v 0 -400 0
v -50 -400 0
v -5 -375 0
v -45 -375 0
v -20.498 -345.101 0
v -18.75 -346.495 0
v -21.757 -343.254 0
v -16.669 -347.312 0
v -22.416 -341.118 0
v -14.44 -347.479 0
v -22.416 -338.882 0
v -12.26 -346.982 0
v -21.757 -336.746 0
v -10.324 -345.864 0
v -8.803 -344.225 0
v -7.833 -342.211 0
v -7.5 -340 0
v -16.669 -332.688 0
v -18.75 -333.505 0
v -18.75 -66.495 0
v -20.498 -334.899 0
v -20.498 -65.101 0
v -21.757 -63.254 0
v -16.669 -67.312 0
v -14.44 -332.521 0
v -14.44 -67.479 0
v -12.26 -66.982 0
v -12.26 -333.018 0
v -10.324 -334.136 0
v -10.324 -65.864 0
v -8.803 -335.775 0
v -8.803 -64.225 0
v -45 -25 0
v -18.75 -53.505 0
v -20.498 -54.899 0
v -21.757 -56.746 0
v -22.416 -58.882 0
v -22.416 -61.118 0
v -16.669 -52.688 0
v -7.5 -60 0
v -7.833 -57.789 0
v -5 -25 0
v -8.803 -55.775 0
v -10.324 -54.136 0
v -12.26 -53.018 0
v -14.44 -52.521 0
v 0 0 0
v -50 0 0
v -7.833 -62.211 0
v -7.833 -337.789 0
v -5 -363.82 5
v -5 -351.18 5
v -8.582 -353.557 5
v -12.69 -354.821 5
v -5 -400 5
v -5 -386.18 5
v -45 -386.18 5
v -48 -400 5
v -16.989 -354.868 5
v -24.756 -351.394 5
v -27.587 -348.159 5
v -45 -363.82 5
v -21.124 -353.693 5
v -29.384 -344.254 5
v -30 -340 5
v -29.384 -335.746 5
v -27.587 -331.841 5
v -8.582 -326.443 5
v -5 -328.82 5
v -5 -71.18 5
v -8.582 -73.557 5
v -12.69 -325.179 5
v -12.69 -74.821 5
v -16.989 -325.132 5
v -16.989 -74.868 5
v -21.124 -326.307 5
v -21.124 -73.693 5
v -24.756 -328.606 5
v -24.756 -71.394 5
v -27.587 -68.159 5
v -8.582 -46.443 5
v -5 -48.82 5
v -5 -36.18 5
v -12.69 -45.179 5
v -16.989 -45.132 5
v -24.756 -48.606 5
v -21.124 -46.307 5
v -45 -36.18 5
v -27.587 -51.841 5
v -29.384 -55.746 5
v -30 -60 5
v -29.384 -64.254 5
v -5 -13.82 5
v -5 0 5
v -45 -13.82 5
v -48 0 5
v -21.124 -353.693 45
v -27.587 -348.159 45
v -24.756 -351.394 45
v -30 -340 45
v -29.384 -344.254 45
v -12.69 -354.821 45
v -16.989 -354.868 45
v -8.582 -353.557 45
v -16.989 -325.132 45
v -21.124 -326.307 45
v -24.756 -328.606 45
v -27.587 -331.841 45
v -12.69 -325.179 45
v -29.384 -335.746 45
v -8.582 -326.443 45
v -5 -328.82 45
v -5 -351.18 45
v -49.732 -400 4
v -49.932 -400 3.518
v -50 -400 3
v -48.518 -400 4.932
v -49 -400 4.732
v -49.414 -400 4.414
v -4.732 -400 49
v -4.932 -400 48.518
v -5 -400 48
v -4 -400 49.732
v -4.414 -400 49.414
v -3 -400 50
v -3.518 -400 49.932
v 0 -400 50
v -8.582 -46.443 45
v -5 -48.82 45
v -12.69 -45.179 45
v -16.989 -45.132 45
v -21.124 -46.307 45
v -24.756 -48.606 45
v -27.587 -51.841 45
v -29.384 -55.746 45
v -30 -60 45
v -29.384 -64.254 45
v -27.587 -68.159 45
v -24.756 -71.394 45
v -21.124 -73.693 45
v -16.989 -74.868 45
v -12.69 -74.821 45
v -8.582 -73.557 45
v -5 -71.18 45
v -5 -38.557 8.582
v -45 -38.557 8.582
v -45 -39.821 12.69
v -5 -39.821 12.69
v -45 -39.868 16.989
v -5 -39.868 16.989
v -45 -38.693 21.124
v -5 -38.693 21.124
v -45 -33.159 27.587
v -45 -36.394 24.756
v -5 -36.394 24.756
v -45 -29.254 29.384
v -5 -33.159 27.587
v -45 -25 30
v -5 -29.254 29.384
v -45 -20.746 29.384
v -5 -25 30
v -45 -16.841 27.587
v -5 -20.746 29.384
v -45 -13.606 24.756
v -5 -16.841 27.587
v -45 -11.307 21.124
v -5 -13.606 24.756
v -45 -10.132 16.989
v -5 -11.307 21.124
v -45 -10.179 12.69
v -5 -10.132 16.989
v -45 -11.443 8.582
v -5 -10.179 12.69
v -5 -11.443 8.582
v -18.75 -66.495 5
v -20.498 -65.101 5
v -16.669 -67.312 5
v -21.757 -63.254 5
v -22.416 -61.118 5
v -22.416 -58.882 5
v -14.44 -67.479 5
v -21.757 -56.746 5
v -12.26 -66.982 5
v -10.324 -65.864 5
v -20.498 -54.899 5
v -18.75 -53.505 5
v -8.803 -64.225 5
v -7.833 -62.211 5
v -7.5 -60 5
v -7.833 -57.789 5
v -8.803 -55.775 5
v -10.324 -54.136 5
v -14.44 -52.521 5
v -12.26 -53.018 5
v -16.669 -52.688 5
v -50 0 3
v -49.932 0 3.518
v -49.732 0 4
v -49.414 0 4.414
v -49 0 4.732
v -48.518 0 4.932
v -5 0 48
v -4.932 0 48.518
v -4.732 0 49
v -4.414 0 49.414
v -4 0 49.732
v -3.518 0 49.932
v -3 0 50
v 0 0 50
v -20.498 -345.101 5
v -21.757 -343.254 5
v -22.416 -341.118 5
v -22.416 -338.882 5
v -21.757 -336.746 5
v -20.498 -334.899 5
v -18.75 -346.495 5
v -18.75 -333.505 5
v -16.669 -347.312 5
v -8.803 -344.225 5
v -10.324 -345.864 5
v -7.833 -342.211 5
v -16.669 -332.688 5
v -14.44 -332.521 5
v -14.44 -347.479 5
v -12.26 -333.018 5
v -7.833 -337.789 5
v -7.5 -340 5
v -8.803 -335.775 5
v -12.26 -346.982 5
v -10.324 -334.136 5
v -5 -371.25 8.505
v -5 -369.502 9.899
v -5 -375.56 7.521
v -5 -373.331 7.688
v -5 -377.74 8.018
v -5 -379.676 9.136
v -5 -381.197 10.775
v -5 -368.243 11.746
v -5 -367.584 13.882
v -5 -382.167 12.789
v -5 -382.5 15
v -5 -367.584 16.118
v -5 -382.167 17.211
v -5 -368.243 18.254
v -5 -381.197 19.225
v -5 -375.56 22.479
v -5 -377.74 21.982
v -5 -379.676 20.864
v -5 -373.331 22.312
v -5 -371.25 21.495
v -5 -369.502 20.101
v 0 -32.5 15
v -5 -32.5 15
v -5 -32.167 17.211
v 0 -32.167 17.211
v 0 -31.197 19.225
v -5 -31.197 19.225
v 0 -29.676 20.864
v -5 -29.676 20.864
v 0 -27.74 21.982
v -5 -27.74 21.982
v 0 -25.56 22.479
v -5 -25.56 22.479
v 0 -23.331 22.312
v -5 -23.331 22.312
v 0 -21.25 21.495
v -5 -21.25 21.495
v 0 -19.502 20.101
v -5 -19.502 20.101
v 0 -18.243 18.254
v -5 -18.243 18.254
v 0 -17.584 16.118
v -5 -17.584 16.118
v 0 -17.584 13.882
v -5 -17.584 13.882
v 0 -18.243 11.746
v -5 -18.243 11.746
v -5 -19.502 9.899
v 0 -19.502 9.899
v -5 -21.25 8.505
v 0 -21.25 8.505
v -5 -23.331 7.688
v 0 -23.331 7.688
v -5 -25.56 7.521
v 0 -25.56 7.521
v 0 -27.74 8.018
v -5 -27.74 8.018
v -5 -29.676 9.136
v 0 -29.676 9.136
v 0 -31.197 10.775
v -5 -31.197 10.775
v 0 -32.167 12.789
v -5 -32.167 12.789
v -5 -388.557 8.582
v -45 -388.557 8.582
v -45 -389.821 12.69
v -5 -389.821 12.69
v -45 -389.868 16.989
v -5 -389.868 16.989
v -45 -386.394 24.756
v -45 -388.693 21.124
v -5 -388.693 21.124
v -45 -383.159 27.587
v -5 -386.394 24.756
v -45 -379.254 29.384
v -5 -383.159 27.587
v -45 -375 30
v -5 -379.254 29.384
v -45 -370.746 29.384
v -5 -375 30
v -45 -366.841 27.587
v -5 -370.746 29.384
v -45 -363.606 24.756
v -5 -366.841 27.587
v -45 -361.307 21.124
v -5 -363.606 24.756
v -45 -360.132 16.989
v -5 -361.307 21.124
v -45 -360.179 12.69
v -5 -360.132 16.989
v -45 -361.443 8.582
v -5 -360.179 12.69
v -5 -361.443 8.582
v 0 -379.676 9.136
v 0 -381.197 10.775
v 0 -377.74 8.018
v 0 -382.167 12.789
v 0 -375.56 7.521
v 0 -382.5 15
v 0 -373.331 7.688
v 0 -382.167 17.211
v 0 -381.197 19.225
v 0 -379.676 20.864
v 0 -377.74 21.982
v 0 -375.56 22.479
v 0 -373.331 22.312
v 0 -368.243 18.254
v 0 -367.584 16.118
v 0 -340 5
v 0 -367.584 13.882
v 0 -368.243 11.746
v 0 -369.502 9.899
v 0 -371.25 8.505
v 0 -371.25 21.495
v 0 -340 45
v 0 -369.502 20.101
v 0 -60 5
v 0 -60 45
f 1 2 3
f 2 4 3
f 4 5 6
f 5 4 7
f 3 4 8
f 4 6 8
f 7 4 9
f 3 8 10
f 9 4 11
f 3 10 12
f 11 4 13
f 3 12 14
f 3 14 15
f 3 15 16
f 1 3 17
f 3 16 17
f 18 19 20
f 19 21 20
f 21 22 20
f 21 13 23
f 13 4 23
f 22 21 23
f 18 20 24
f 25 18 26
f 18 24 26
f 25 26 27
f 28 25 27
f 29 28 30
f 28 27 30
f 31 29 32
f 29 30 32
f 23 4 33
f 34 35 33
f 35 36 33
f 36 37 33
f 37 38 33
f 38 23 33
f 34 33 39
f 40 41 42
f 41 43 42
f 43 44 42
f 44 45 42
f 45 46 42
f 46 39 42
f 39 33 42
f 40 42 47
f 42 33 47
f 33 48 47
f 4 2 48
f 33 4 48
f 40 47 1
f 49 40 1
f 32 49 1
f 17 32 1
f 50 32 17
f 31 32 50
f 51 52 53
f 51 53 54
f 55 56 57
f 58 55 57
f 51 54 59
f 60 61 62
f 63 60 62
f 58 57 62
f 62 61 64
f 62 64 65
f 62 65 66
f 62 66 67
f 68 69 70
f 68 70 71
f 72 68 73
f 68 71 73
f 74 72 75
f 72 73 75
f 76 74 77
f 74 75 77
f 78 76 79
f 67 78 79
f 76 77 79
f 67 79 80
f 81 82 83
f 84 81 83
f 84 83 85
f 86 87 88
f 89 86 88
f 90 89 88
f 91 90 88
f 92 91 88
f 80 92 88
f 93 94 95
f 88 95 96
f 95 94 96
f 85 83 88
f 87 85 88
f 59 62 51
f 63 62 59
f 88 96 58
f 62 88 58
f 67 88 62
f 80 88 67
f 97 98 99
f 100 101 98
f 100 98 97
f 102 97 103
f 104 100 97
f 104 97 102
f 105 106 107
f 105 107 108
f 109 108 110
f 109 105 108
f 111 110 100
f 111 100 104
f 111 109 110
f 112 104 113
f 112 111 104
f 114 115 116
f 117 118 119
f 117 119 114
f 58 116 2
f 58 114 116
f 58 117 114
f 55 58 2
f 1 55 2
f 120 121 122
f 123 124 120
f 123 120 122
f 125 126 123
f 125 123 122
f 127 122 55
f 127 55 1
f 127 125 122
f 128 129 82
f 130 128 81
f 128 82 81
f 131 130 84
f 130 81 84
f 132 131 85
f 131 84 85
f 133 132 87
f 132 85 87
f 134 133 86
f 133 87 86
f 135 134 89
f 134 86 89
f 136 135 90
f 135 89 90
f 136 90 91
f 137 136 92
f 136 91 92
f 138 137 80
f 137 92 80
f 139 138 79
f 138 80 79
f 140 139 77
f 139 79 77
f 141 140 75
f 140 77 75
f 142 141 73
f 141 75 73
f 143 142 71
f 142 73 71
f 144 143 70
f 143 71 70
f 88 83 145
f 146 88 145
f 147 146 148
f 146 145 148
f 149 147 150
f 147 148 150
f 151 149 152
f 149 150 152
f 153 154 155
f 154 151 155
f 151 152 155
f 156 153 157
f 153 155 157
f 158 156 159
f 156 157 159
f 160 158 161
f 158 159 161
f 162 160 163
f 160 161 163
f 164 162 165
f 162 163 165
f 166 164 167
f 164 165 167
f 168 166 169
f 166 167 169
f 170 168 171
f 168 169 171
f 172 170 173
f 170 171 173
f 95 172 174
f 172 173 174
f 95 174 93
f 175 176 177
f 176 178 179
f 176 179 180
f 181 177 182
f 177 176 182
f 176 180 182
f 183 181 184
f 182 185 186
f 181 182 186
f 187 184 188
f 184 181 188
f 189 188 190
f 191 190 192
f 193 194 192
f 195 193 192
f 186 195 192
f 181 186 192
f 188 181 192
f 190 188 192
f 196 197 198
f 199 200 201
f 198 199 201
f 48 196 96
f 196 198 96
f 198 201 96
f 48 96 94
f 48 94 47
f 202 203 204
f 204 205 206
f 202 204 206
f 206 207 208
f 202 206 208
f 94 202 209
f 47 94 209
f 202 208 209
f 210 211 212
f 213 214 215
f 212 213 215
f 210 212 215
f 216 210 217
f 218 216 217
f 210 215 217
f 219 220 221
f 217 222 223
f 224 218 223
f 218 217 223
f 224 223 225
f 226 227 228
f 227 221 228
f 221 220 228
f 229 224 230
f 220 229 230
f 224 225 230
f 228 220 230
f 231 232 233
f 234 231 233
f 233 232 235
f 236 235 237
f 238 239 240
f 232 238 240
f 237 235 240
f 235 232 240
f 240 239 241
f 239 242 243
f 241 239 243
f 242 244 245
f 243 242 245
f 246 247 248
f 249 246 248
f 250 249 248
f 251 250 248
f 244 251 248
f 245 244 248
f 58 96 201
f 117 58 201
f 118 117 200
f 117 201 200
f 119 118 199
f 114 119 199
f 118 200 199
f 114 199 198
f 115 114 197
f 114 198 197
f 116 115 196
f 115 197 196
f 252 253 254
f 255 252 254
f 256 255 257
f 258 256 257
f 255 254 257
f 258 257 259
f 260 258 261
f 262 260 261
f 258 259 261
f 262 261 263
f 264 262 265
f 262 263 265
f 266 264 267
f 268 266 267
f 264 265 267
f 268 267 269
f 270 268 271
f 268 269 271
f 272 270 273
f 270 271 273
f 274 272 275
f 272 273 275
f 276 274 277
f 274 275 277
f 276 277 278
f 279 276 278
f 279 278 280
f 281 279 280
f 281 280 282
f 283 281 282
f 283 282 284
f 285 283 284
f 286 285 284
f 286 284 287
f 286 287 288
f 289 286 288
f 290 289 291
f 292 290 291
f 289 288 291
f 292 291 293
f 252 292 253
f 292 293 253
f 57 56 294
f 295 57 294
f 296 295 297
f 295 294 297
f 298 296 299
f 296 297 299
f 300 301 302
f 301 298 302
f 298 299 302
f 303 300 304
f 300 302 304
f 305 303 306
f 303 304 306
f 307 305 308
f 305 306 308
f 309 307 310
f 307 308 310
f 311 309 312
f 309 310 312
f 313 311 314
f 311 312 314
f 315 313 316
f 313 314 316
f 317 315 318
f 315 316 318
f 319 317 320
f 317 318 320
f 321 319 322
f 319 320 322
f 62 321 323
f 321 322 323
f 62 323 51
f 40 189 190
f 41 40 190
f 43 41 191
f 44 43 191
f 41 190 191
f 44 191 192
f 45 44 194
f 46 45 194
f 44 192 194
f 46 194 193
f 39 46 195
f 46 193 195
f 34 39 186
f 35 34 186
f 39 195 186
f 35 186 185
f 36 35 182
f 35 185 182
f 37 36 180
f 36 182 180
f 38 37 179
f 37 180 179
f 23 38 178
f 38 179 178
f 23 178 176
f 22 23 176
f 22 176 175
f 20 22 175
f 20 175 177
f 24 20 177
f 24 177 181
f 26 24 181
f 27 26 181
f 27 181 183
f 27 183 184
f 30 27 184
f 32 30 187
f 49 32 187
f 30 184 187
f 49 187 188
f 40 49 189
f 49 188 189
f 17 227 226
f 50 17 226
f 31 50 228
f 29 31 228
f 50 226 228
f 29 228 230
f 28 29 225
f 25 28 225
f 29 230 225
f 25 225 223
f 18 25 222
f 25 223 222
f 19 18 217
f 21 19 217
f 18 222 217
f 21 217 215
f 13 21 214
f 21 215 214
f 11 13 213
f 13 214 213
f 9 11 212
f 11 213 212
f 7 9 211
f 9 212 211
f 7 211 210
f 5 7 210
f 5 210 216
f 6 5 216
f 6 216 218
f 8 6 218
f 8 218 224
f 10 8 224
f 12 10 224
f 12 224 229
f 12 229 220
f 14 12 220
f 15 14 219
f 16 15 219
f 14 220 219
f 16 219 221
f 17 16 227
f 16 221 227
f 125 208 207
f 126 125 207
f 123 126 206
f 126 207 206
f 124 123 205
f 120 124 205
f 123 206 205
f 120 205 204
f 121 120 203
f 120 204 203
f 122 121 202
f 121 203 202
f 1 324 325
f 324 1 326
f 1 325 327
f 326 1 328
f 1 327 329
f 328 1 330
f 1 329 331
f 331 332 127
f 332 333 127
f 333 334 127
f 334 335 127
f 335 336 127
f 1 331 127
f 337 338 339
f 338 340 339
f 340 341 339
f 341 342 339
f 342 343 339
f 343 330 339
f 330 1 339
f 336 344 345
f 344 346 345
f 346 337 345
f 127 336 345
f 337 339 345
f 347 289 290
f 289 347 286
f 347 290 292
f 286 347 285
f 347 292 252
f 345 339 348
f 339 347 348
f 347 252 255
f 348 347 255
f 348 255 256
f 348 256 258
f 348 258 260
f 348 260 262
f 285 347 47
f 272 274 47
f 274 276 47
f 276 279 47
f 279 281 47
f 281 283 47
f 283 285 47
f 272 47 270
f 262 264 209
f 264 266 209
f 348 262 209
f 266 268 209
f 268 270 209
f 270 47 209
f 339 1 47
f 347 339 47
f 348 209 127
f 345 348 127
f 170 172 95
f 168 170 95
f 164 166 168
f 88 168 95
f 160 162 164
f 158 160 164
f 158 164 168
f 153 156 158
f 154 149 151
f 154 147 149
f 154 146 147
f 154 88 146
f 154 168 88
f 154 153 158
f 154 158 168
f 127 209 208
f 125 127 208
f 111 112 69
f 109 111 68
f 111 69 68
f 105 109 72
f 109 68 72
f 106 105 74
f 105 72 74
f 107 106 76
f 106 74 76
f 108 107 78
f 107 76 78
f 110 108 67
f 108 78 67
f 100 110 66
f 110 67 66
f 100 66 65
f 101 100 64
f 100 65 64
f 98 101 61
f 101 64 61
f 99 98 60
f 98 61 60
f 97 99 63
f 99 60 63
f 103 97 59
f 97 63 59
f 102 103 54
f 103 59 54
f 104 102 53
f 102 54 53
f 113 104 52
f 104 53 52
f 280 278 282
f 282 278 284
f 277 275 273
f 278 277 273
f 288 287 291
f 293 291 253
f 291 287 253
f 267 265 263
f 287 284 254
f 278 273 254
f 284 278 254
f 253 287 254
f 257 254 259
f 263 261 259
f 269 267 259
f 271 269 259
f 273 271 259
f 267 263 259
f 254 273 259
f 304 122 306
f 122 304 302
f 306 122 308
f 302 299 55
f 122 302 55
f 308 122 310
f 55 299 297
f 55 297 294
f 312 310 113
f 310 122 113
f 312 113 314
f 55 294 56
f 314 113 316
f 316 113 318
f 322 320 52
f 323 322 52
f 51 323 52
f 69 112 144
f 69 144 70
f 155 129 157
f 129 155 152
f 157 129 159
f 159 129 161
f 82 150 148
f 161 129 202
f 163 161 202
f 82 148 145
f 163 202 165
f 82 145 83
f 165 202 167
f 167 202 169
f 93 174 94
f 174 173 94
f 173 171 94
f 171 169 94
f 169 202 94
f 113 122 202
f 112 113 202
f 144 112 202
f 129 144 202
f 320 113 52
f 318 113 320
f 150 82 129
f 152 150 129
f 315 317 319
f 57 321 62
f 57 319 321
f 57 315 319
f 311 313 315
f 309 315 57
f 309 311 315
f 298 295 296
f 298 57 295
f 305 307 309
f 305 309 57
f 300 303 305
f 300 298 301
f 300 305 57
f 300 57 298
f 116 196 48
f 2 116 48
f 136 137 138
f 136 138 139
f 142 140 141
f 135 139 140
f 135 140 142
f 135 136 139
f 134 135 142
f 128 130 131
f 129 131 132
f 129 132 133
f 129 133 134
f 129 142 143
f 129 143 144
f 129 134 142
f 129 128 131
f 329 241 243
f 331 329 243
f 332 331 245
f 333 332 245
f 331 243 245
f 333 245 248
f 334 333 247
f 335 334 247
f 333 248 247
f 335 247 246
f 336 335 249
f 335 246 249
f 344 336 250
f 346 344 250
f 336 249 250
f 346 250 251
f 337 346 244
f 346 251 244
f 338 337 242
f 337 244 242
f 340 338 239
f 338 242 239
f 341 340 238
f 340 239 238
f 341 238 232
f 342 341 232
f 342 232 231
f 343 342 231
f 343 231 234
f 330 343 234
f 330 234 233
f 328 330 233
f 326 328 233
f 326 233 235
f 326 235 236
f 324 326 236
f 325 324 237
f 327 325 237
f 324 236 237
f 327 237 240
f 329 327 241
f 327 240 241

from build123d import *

# Parameters (mm, degrees)
F1_DEPTH = 400
F2_R     = 7.5
F3_DEPTH = 5
F4_R     = 7.5
F5_DEPTH = 5
F6_R     = 15
F7_DEPTH = 40
F8_R     = 15
F9_DEPTH = 40


with BuildPart() as f1:
    # F0 (on Front) → F1 (new body)
    with BuildSketch(Plane.XZ):
        with BuildLine():
            Line((0, 50), (-3, 50))
            ThreePointArc((-3, 50), (-4.414214, 49.414214), (-5, 48))
            Line((-5, 48), (-5, 5))
            Line((-5, 5), (-48, 5))
            ThreePointArc((-48, 5), (-49.414214, 4.414214), (-50, 3))
            Line((-50, 3), (-50, 0))
            Line((-50, 0), (0, 0))
            Line((0, 0), (0, 50))
        make_face()
    extrude(amount=F1_DEPTH)

    # F2 (on face) → F3 (cut, through all)
    with BuildSketch(Plane(origin=(-5, 0, 0), x_dir=(0, -1, 0), z_dir=(-1, 0, 0))):
        with Locations((25, 15)):
            Circle(F2_R)
        with Locations((375, 15)):
            Circle(F2_R)
    extrude(amount=-F3_DEPTH, mode=Mode.SUBTRACT)

    # F4 (on face) → F5 (cut, through all)
    with BuildSketch(Plane.XY.offset(5)):
        with Locations((-15, -60)):
            Circle(F4_R)
        with Locations((-15, -340)):
            Circle(F4_R)
    extrude(amount=-F5_DEPTH, mode=Mode.SUBTRACT)

    # F6 (on face) → F7 (join)
    with BuildSketch(Plane(origin=(-5, 0, 0), x_dir=(0, -1, 0), z_dir=(-1, 0, 0))):
        with Locations((375, 15)):
            Circle(F6_R)
        with Locations((25, 15)):
            Circle(F6_R)
    extrude(amount=F7_DEPTH)

    # F8 (on face) → F9 (join)
    with BuildSketch(Plane.XY.offset(5)):
        with Locations((-15, -340)):
            Circle(F8_R)
        with Locations((-15, -60)):
            Circle(F8_R)
    extrude(amount=F9_DEPTH)


solid = f1.part
